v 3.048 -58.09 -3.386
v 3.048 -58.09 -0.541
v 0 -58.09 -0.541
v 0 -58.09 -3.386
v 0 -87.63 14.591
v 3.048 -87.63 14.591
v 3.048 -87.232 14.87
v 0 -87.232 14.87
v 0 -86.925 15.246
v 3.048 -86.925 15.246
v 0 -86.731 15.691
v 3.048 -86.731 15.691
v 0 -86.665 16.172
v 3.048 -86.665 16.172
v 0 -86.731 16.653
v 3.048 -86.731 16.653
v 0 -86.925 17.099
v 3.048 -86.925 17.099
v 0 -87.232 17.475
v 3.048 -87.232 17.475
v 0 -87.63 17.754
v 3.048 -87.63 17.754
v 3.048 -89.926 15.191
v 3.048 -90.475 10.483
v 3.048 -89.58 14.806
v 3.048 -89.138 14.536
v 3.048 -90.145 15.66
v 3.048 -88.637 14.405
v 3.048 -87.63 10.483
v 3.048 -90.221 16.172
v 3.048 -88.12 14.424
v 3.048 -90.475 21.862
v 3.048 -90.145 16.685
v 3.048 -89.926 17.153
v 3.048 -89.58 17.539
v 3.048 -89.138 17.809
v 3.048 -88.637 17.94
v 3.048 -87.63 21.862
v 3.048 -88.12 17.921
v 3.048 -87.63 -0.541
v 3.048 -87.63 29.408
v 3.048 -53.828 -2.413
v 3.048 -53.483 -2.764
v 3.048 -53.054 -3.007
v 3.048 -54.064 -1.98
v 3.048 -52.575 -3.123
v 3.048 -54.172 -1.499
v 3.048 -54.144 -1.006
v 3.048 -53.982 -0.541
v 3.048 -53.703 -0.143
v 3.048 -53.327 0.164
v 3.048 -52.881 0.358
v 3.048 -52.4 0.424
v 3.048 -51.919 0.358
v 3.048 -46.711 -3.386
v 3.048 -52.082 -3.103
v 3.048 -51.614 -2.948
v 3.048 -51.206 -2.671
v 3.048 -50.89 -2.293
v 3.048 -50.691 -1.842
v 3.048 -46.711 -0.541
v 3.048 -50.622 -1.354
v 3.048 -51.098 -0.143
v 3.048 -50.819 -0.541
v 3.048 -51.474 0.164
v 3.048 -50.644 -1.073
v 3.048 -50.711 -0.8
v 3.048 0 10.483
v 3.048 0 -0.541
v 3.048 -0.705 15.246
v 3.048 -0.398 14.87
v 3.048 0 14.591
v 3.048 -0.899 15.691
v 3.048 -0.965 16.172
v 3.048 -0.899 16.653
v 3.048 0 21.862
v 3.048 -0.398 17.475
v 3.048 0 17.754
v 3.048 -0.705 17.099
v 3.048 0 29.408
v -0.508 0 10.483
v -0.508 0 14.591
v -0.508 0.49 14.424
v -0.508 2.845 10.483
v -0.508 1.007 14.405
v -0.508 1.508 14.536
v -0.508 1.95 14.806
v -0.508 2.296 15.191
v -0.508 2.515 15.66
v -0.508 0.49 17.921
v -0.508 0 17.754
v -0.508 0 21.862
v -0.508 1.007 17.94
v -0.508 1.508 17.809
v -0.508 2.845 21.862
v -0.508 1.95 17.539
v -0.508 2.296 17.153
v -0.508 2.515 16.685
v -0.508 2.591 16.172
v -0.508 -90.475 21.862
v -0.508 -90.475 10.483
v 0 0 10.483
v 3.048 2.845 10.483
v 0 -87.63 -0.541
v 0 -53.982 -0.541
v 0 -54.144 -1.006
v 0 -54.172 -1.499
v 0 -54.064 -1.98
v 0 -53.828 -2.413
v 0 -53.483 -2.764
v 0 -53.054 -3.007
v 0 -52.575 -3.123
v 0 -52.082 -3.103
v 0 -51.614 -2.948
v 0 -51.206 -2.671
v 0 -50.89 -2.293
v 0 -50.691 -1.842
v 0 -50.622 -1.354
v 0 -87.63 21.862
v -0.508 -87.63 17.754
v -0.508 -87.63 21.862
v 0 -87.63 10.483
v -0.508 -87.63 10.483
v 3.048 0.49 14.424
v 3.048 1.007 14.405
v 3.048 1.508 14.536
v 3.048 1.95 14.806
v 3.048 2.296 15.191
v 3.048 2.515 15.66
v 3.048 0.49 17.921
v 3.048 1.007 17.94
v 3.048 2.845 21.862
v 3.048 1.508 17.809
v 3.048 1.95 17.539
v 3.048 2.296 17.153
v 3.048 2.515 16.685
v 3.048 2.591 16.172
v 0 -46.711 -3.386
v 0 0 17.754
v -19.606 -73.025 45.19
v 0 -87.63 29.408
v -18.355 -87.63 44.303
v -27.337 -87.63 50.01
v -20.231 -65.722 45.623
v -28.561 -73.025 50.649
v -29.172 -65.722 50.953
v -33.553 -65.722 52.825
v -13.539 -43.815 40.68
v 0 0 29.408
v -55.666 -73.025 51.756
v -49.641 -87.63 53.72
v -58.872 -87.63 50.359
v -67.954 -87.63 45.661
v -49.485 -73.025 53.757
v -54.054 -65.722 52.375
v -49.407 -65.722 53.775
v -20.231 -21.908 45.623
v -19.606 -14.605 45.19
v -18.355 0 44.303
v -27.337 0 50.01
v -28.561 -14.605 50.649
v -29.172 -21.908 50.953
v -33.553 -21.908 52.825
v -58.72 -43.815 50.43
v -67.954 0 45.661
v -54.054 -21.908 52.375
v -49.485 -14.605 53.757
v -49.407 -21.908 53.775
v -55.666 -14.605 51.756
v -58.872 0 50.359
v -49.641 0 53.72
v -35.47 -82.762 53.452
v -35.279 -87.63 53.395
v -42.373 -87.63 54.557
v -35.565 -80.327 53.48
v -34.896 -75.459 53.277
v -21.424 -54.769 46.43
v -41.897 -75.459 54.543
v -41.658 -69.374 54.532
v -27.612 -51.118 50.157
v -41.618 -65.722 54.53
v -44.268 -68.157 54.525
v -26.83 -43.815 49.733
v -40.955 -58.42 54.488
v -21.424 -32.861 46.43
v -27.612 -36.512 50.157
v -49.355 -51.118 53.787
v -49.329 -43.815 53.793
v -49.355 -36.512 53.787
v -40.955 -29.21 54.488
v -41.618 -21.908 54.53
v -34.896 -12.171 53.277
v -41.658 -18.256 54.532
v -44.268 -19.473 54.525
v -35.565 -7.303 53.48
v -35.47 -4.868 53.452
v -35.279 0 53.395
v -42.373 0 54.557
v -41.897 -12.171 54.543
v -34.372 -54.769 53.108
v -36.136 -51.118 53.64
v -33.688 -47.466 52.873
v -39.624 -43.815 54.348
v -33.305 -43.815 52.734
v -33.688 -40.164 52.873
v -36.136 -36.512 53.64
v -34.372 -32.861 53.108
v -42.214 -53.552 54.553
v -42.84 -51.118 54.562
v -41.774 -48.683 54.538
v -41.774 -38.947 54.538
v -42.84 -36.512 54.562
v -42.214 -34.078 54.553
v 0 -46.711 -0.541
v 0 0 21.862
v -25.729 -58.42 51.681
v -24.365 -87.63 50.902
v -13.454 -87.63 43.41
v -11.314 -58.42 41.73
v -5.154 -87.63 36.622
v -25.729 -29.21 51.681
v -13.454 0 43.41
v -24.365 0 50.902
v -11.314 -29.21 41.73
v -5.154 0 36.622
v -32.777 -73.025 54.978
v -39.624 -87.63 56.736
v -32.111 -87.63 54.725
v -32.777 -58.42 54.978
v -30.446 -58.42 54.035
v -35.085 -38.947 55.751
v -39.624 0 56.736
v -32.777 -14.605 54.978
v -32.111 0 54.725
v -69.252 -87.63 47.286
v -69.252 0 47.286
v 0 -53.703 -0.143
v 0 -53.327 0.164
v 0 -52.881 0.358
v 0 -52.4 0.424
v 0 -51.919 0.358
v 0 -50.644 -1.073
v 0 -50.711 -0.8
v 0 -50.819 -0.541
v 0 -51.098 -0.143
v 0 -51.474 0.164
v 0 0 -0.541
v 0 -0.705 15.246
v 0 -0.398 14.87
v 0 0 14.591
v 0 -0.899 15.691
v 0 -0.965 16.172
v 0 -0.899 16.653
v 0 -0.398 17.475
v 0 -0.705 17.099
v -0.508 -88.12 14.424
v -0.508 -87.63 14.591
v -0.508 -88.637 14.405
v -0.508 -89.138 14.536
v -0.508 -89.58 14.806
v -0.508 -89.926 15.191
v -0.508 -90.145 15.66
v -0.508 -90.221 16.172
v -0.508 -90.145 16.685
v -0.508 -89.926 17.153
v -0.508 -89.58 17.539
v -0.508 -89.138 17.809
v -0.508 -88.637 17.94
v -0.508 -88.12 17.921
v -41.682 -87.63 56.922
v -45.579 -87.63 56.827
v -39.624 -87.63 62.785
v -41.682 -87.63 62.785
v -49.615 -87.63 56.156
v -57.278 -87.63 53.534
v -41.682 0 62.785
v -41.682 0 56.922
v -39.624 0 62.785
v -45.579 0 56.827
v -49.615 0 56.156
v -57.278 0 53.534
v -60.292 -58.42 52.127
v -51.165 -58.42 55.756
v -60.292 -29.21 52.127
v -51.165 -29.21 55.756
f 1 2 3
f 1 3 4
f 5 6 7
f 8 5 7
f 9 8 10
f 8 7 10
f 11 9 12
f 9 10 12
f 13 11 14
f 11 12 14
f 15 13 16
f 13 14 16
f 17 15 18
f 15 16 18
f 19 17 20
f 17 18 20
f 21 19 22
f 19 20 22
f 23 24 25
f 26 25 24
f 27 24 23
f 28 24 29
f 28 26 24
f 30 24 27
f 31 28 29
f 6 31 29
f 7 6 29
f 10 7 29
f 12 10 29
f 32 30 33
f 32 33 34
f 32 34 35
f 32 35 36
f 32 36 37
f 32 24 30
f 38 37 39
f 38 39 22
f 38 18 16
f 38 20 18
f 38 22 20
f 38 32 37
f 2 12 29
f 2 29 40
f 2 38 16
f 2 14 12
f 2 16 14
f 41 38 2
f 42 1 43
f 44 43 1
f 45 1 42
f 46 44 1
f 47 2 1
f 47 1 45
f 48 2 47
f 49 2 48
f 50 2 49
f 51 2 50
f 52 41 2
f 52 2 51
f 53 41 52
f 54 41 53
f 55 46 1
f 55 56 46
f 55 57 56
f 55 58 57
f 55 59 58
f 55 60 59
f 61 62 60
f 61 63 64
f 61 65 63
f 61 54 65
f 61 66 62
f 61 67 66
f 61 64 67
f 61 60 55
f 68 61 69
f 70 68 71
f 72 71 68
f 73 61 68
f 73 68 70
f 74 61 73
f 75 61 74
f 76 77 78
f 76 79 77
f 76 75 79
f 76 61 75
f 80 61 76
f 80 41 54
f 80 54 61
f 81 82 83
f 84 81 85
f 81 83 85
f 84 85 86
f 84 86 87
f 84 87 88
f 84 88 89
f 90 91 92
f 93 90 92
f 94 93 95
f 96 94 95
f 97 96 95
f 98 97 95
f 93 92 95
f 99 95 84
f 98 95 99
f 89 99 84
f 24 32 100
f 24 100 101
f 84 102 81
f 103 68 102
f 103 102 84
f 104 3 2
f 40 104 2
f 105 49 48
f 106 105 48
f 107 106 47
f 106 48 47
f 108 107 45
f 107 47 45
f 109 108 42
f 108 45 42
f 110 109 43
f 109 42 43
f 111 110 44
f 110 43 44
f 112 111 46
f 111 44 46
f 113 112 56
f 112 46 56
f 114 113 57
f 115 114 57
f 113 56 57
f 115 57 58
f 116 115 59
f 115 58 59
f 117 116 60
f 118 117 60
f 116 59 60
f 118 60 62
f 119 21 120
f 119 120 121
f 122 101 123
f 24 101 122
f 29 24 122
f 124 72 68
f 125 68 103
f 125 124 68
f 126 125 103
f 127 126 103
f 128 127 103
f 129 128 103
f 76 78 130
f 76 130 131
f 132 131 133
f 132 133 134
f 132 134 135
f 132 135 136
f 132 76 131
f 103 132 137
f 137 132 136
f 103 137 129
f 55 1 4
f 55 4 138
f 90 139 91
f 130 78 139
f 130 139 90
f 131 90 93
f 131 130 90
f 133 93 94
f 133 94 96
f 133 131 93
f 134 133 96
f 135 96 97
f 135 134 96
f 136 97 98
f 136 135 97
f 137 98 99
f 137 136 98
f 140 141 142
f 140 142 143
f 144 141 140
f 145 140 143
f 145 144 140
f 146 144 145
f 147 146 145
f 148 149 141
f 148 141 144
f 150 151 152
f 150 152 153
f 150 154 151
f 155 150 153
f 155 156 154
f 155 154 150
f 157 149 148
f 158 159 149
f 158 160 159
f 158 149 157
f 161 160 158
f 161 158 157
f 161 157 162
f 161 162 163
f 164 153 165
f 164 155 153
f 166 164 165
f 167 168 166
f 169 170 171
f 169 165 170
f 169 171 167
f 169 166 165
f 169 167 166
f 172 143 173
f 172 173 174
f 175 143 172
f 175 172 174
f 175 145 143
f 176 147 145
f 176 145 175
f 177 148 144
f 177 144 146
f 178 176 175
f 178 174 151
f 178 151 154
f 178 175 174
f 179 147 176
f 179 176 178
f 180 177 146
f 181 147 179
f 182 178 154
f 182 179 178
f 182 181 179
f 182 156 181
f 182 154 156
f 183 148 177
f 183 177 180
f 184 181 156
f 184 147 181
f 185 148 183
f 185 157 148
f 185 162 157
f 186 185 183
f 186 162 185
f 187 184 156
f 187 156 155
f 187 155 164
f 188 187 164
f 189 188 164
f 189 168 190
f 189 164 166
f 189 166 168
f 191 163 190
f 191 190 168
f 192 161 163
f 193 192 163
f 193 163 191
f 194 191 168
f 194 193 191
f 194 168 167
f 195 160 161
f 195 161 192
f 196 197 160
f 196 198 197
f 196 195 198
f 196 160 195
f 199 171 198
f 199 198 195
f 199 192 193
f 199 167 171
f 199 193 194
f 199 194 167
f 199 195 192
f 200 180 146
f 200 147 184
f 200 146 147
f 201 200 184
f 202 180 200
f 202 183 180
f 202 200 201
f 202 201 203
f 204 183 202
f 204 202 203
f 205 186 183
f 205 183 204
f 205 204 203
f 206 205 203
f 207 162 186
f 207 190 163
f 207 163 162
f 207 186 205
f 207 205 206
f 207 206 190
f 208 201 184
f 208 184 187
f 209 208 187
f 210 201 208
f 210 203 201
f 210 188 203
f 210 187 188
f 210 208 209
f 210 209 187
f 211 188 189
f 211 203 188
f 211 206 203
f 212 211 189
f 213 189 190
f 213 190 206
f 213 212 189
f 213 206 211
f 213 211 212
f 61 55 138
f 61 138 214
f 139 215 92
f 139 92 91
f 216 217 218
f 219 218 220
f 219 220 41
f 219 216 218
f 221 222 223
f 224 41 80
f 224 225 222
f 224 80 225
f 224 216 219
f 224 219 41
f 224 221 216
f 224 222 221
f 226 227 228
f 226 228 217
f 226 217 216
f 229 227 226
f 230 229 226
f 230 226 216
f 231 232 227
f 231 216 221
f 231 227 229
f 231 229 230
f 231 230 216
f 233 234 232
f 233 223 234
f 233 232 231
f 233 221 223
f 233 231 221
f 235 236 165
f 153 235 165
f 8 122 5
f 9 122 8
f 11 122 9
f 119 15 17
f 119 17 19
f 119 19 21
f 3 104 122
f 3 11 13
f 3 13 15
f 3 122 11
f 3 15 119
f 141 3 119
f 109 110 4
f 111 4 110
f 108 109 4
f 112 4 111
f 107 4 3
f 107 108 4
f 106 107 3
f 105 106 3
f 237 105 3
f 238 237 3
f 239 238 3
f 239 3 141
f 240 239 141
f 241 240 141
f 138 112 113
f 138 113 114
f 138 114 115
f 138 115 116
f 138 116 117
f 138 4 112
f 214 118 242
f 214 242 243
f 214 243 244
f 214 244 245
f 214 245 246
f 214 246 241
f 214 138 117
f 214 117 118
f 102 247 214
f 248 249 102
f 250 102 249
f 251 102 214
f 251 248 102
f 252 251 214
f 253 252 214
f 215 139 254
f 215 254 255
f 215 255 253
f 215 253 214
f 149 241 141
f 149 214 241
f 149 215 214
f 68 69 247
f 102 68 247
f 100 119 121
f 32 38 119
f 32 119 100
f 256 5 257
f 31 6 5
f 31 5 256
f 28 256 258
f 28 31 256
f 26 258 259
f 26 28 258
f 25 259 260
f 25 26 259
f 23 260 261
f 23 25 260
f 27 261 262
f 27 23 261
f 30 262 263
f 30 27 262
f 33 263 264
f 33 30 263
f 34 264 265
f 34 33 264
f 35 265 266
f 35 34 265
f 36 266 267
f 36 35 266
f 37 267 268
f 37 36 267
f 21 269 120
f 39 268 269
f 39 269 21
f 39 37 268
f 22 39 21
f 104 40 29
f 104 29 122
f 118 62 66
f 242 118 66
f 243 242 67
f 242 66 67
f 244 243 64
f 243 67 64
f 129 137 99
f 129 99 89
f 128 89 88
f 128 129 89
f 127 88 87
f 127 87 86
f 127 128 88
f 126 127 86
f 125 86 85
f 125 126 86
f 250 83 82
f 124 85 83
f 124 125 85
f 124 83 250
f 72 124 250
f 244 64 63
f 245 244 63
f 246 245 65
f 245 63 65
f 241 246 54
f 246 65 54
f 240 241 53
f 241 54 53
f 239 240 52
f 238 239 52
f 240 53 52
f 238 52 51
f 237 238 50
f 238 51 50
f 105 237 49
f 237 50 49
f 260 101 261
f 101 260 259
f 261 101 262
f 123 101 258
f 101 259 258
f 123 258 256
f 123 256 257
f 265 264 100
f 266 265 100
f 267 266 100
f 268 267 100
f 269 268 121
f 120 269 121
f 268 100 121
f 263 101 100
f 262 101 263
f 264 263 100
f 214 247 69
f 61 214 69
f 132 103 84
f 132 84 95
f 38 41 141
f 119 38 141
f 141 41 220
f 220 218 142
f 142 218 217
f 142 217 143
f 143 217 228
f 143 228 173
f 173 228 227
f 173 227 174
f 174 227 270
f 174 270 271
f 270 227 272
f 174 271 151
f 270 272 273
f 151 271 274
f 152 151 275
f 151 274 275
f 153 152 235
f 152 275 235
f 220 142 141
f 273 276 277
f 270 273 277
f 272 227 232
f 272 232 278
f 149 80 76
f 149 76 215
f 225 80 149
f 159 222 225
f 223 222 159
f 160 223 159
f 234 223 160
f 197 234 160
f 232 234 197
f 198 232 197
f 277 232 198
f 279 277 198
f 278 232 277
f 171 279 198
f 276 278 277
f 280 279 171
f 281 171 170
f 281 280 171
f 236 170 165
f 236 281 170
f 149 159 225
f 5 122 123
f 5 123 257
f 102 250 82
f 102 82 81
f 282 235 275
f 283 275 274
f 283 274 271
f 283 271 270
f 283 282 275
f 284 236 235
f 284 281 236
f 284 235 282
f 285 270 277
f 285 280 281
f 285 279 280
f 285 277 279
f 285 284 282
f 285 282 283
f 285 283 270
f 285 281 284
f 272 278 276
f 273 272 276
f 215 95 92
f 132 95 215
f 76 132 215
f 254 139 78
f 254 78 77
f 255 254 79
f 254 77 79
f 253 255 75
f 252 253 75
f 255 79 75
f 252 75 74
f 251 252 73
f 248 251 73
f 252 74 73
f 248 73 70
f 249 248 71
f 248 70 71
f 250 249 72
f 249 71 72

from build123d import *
from build123d import SkipClean  # not in build123d's __all__

# Parameters (mm, degrees)
F0_W     = 3.048
F0_H     = 29.9492416
F1_DEPTH = 87.63
F2_R     = 1.778
F3_DEPTH = 3.048
F4_DEPTH = 25.4
F5_DEPTH = 25.4
F6_DEPTH = 3.556
F7_DEPTH = 3.556


with BuildPart() as f1:
    # F0 (on Front) → F1 (new body)
    with BuildSketch(Plane.XZ):
        with BuildLine():
            add(Edge.make_bspline(
                [(-69.252148823, 47.2862608473), (-60.3127224637, 52.3166042602), (-51.4062820573, 57.4050875064), (-41.6824767012, 56.9220757762)],
                knots=[0, 0, 0, 0, 0.4104821983, 0.4104821983, 0.4104821983, 0.4104821983], degree=3))
            Line((-69.252148823, 47.2862608473), (-67.9539144039, 45.6614680588))
            add(Edge.make_bspline(
                [(0, 29.4084157124), (-13.5805348603, 41.0502040776), (-37.9650308205, 61.9535885379), (-58.746385608, 50.6636605559), (-67.9539144039, 45.6614680588)],
                knots=[0, 0, 0, 0, 0.5569331793, 1, 1, 1, 1], degree=3))
            Line((0, 29.4084157124), (3.048, 29.4084157124))
            add(Edge.make_bspline(
                [(-39.6240018308, 56.7362643778), (-26.1787631346, 54.9709717695), (-11.0970199105, 42.072411724), (3.048, 29.4084157124)],
                knots=[0.4392739055, 0.4392739055, 0.4392739055, 0.4392739055, 1, 1, 1, 1], degree=3))
            add(Edge.make_bspline(
                [(-41.6824767012, 56.9220757762), (-41.0004374843, 56.8881967617), (-40.3143770071, 56.8269071863), (-39.6240018308, 56.7362643778)],
                knots=[0.4104821983, 0.4104821983, 0.4104821983, 0.4104821983, 0.4392739055, 0.4392739055, 0.4392739055, 0.4392739055], degree=3))
        make_face()
        with BuildLine():
            Line((-41.6824767012, 62.7852019621), (-41.6824767012, 56.9220757762))
            add(Edge.make_bspline(
                [(-41.6824767012, 56.9220757762), (-41.0004374843, 56.8881967617), (-40.3143770071, 56.8269071863), (-39.6240018308, 56.7362643778)],
                knots=[0.4104821983, 0.4104821983, 0.4104821983, 0.4104821983, 0.4392739055, 0.4392739055, 0.4392739055, 0.4392739055], degree=3))
            Line((-39.6240018308, 56.7362643778), (-39.6240018308, 62.7852019621))
            Line((-39.6240018308, 62.7852019621), (-41.6824767012, 62.7852019621))
        make_face()
        with Locations((1.524, 14.4337949124)):
            Rectangle(F0_W, F0_H)
    extrude(amount=F1_DEPTH)

    # F2 (on face) → F3 (join)
    with BuildSketch(Plane.YZ.offset(3.048)):
        with Locations((-52.4002, -1.3536258876)):
            Circle(F2_R)
        with Locations((-88.4428, 16.1723741124)):
            Circle(F2_R)
        with Locations((0.8128, 16.1723741124)):
            Circle(F2_R)
        with BuildLine():
            Line((-53.9815412535, -0.5408258876), (-58.0898, -0.5408258876))
            Line((-58.0898, -0.5408258876), (-58.0898, -3.3856258876))
            Line((-58.0898, -3.3856258876), (-46.7106, -3.3856258876))
            Line((-46.7106, -3.3856258876), (-46.7106, -0.5408258876))
            Line((-46.7106, -0.5408258876), (-50.8188587465, -0.5408258876))
            ThreePointArc((-50.8188587465, -0.5408258876), (-50.6720639017, -0.9354995602), (-50.6222, -1.3536258876))
            ThreePointArc((-50.6222, -1.3536258876), (-52.8183263274, -3.0817619859), (-53.9815412535, -0.5408258876))
        make_face()
    extrude(amount=-F3_DEPTH)

    # F2 (on face) → F4 (cut)
    with BuildSketch(Plane.YZ.offset(3.048)):
        with BuildLine():
            ThreePointArc((-50.8188587465, -0.5408258876), (-52.4002, 0.4243741124), (-53.9815412535, -0.5408258876))
            Line((-53.9815412535, -0.5408258876), (-50.8188587465, -0.5408258876))
        make_face()
        with BuildLine():
            Line((-50.8188587465, -0.5408258876), (-53.9815412535, -0.5408258876))
            ThreePointArc((-53.9815412535, -0.5408258876), (-52.8183263274, -3.0817619859), (-50.6222, -1.3536258876))
            ThreePointArc((-50.6222, -1.3536258876), (-50.6720639017, -0.9354995602), (-50.8188587465, -0.5408258876))
        make_face()
    extrude(amount=-F4_DEPTH, mode=Mode.SUBTRACT)

    # F2 (on face) → F5 (cut)
    with BuildSketch(Plane.YZ.offset(3.048)):
        with Locations((-52.4002, -1.3536258876)):
            Circle(F2_R)
        with Locations((-88.4428, 16.1723741124)):
            Circle(F2_R)
        with Locations((0.8128, 16.1723741124)):
            Circle(F2_R)
        with BuildLine():
            Line((-87.63, 17.7537153659), (-87.63, 14.5910328589))
            ThreePointArc((-87.63, 14.5910328589), (-86.9251632846, 15.24605732), (-86.6648, 16.1723741124))
            ThreePointArc((-86.6648, 16.1723741124), (-86.9251632846, 17.0986909049), (-87.63, 17.7537153659))
        make_face()
    extrude(amount=-F5_DEPTH, mode=Mode.SUBTRACT)

    # F2 (on face) → F6 (join)
    with BuildSketch(Plane.YZ.offset(3.048)):
        with BuildLine():
            Line((-90.4748, 10.4827741124), (-87.63, 10.4827741124))
            Line((-87.63, 10.4827741124), (-87.63, 14.5910328589))
            ThreePointArc((-87.63, 14.5910328589), (-90.2208, 16.1723741124), (-87.63, 17.7537153659))
            Line((-87.63, 17.7537153659), (-87.63, 21.8619741124))
            Line((-87.63, 21.8619741124), (-90.4748, 21.8619741124))
            Line((-90.4748, 21.8619741124), (-90.4748, 10.4827741124))
        make_face()
    extrude(amount=-F6_DEPTH)

    # F2 (on face) → F7 (join)
    with BuildSketch(Plane.YZ.offset(3.048)):
        with BuildLine():
            Line((0, 14.5910328589), (0, 10.4827741124))
            Line((0, 10.4827741124), (2.8448, 10.4827741124))
            Line((2.8448, 10.4827741124), (2.8448, 21.8619741124))
            Line((2.8448, 21.8619741124), (0, 21.8619741124))
            Line((0, 21.8619741124), (0, 17.7537153659))
            ThreePointArc((0, 17.7537153659), (1.7391167925, 17.6900108278), (2.5908, 16.1723741124))
            ThreePointArc((2.5908, 16.1723741124), (1.7391167925, 14.654737397), (0, 14.5910328589))
        make_face()
    with SkipClean():  # cleaning this boolean's faces spoils the solid; the shape is the same uncleaned
        extrude(amount=-F7_DEPTH)


solid = f1.part
